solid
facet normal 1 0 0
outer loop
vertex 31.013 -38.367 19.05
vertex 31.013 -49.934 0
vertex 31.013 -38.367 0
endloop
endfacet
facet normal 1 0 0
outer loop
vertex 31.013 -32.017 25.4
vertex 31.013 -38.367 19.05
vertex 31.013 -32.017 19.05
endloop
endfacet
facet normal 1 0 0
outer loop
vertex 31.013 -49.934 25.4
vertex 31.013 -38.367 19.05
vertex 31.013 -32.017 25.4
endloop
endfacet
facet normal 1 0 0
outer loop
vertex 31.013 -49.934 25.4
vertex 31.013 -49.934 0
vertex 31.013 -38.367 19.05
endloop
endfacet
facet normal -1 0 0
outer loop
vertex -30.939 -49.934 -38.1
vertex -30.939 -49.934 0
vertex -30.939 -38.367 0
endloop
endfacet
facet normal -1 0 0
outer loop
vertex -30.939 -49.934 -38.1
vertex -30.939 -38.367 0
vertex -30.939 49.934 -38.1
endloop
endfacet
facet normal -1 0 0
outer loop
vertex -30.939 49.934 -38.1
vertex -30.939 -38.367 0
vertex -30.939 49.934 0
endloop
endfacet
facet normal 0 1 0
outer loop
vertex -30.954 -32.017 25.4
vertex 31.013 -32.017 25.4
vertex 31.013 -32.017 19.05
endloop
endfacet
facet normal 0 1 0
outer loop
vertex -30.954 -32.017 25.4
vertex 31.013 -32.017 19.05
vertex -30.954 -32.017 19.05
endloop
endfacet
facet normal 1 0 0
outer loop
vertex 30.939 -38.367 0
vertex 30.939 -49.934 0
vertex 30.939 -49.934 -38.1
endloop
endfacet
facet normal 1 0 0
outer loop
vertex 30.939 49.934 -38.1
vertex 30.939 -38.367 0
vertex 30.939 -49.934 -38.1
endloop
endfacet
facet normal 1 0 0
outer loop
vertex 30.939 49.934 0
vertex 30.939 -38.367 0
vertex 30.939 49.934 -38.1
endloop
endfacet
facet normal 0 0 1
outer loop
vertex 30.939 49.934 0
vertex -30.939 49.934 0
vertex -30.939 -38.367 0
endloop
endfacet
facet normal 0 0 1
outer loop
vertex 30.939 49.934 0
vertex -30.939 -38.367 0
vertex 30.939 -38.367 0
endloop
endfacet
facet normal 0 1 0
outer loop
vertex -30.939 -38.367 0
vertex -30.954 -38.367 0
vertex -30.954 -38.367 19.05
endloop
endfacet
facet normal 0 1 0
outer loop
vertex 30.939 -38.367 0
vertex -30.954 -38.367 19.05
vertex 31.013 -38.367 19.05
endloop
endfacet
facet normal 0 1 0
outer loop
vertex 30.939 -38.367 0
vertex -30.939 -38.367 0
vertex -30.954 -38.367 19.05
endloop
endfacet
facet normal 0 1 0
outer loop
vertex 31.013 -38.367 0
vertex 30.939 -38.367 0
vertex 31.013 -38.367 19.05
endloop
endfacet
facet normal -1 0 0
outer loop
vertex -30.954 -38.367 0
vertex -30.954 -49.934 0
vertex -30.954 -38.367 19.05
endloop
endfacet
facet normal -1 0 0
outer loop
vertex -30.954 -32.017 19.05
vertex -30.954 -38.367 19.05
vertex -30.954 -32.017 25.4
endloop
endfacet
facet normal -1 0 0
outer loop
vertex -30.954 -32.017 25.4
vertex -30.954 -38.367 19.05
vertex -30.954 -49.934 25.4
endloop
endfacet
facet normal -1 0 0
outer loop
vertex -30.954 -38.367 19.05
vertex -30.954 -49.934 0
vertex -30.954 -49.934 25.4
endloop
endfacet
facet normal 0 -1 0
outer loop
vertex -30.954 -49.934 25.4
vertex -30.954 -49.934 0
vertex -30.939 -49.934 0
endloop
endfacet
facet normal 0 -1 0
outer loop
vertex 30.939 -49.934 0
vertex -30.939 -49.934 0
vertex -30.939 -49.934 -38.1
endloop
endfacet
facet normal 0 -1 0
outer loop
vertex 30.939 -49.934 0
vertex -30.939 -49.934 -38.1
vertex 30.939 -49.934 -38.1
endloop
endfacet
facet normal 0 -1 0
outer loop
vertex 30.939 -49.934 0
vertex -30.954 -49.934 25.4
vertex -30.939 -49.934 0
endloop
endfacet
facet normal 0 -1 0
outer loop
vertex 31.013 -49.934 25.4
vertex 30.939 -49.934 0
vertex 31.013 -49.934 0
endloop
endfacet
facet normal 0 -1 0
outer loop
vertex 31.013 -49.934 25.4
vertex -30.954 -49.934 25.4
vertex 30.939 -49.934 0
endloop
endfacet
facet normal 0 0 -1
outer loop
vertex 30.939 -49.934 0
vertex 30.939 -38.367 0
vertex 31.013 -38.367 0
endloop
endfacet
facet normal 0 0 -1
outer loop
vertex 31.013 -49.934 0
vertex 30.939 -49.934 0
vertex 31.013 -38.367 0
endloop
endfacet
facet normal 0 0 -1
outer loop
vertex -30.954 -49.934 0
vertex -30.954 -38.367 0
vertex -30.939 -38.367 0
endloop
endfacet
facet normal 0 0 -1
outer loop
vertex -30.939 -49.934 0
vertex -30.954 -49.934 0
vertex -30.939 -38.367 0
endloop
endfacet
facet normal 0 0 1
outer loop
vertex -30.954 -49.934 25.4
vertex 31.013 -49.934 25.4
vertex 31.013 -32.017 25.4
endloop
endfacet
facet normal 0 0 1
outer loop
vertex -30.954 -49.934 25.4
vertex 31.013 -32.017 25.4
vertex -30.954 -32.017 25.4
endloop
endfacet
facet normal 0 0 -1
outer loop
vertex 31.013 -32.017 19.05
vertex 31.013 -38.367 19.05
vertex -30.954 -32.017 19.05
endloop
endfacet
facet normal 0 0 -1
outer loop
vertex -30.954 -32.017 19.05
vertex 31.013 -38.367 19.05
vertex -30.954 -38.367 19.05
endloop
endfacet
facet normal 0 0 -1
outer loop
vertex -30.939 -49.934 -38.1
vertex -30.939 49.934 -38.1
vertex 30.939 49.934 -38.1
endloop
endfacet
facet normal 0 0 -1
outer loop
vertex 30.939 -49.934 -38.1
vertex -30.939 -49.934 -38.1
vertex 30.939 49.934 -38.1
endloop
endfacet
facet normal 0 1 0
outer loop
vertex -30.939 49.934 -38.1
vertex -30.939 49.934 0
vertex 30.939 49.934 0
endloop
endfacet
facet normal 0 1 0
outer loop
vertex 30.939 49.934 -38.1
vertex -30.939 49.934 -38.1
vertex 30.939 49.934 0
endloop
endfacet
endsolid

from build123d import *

# Parameters (mm, degrees)
F1_W     = 61.967276
F1_H     = 11.567712
F2_DEPTH = 25.4
F0_W     = 61.878238
F0_H     = 99.868604
F3_DEPTH = 38.1
F4_W     = 61.967276
F4_H     = 6.35
F5_DEPTH = 6.35


with BuildPart() as f2:
    # F1 (on Top) → F2 (new body)
    with BuildSketch(Plane.XY):
        with Locations((0.029806, -44.150446)):
            Rectangle(F1_W, F1_H)
    extrude(amount=F2_DEPTH)

    # F0 (on Top) → F3 (join)
    with BuildSketch(Plane.XY):
        Rectangle(F0_W, F0_H)
    extrude(amount=-F3_DEPTH)

    # F4 (on face) → F5 (join)
    with BuildSketch(Plane(origin=(0, -38.36659, 0), x_dir=(-1, 0, 0), z_dir=(0, 1, 0))):
        with Locations((-0.029806, 22.225)):
            Rectangle(F4_W, F4_H)
    extrude(amount=F5_DEPTH)


solid = f2.part
